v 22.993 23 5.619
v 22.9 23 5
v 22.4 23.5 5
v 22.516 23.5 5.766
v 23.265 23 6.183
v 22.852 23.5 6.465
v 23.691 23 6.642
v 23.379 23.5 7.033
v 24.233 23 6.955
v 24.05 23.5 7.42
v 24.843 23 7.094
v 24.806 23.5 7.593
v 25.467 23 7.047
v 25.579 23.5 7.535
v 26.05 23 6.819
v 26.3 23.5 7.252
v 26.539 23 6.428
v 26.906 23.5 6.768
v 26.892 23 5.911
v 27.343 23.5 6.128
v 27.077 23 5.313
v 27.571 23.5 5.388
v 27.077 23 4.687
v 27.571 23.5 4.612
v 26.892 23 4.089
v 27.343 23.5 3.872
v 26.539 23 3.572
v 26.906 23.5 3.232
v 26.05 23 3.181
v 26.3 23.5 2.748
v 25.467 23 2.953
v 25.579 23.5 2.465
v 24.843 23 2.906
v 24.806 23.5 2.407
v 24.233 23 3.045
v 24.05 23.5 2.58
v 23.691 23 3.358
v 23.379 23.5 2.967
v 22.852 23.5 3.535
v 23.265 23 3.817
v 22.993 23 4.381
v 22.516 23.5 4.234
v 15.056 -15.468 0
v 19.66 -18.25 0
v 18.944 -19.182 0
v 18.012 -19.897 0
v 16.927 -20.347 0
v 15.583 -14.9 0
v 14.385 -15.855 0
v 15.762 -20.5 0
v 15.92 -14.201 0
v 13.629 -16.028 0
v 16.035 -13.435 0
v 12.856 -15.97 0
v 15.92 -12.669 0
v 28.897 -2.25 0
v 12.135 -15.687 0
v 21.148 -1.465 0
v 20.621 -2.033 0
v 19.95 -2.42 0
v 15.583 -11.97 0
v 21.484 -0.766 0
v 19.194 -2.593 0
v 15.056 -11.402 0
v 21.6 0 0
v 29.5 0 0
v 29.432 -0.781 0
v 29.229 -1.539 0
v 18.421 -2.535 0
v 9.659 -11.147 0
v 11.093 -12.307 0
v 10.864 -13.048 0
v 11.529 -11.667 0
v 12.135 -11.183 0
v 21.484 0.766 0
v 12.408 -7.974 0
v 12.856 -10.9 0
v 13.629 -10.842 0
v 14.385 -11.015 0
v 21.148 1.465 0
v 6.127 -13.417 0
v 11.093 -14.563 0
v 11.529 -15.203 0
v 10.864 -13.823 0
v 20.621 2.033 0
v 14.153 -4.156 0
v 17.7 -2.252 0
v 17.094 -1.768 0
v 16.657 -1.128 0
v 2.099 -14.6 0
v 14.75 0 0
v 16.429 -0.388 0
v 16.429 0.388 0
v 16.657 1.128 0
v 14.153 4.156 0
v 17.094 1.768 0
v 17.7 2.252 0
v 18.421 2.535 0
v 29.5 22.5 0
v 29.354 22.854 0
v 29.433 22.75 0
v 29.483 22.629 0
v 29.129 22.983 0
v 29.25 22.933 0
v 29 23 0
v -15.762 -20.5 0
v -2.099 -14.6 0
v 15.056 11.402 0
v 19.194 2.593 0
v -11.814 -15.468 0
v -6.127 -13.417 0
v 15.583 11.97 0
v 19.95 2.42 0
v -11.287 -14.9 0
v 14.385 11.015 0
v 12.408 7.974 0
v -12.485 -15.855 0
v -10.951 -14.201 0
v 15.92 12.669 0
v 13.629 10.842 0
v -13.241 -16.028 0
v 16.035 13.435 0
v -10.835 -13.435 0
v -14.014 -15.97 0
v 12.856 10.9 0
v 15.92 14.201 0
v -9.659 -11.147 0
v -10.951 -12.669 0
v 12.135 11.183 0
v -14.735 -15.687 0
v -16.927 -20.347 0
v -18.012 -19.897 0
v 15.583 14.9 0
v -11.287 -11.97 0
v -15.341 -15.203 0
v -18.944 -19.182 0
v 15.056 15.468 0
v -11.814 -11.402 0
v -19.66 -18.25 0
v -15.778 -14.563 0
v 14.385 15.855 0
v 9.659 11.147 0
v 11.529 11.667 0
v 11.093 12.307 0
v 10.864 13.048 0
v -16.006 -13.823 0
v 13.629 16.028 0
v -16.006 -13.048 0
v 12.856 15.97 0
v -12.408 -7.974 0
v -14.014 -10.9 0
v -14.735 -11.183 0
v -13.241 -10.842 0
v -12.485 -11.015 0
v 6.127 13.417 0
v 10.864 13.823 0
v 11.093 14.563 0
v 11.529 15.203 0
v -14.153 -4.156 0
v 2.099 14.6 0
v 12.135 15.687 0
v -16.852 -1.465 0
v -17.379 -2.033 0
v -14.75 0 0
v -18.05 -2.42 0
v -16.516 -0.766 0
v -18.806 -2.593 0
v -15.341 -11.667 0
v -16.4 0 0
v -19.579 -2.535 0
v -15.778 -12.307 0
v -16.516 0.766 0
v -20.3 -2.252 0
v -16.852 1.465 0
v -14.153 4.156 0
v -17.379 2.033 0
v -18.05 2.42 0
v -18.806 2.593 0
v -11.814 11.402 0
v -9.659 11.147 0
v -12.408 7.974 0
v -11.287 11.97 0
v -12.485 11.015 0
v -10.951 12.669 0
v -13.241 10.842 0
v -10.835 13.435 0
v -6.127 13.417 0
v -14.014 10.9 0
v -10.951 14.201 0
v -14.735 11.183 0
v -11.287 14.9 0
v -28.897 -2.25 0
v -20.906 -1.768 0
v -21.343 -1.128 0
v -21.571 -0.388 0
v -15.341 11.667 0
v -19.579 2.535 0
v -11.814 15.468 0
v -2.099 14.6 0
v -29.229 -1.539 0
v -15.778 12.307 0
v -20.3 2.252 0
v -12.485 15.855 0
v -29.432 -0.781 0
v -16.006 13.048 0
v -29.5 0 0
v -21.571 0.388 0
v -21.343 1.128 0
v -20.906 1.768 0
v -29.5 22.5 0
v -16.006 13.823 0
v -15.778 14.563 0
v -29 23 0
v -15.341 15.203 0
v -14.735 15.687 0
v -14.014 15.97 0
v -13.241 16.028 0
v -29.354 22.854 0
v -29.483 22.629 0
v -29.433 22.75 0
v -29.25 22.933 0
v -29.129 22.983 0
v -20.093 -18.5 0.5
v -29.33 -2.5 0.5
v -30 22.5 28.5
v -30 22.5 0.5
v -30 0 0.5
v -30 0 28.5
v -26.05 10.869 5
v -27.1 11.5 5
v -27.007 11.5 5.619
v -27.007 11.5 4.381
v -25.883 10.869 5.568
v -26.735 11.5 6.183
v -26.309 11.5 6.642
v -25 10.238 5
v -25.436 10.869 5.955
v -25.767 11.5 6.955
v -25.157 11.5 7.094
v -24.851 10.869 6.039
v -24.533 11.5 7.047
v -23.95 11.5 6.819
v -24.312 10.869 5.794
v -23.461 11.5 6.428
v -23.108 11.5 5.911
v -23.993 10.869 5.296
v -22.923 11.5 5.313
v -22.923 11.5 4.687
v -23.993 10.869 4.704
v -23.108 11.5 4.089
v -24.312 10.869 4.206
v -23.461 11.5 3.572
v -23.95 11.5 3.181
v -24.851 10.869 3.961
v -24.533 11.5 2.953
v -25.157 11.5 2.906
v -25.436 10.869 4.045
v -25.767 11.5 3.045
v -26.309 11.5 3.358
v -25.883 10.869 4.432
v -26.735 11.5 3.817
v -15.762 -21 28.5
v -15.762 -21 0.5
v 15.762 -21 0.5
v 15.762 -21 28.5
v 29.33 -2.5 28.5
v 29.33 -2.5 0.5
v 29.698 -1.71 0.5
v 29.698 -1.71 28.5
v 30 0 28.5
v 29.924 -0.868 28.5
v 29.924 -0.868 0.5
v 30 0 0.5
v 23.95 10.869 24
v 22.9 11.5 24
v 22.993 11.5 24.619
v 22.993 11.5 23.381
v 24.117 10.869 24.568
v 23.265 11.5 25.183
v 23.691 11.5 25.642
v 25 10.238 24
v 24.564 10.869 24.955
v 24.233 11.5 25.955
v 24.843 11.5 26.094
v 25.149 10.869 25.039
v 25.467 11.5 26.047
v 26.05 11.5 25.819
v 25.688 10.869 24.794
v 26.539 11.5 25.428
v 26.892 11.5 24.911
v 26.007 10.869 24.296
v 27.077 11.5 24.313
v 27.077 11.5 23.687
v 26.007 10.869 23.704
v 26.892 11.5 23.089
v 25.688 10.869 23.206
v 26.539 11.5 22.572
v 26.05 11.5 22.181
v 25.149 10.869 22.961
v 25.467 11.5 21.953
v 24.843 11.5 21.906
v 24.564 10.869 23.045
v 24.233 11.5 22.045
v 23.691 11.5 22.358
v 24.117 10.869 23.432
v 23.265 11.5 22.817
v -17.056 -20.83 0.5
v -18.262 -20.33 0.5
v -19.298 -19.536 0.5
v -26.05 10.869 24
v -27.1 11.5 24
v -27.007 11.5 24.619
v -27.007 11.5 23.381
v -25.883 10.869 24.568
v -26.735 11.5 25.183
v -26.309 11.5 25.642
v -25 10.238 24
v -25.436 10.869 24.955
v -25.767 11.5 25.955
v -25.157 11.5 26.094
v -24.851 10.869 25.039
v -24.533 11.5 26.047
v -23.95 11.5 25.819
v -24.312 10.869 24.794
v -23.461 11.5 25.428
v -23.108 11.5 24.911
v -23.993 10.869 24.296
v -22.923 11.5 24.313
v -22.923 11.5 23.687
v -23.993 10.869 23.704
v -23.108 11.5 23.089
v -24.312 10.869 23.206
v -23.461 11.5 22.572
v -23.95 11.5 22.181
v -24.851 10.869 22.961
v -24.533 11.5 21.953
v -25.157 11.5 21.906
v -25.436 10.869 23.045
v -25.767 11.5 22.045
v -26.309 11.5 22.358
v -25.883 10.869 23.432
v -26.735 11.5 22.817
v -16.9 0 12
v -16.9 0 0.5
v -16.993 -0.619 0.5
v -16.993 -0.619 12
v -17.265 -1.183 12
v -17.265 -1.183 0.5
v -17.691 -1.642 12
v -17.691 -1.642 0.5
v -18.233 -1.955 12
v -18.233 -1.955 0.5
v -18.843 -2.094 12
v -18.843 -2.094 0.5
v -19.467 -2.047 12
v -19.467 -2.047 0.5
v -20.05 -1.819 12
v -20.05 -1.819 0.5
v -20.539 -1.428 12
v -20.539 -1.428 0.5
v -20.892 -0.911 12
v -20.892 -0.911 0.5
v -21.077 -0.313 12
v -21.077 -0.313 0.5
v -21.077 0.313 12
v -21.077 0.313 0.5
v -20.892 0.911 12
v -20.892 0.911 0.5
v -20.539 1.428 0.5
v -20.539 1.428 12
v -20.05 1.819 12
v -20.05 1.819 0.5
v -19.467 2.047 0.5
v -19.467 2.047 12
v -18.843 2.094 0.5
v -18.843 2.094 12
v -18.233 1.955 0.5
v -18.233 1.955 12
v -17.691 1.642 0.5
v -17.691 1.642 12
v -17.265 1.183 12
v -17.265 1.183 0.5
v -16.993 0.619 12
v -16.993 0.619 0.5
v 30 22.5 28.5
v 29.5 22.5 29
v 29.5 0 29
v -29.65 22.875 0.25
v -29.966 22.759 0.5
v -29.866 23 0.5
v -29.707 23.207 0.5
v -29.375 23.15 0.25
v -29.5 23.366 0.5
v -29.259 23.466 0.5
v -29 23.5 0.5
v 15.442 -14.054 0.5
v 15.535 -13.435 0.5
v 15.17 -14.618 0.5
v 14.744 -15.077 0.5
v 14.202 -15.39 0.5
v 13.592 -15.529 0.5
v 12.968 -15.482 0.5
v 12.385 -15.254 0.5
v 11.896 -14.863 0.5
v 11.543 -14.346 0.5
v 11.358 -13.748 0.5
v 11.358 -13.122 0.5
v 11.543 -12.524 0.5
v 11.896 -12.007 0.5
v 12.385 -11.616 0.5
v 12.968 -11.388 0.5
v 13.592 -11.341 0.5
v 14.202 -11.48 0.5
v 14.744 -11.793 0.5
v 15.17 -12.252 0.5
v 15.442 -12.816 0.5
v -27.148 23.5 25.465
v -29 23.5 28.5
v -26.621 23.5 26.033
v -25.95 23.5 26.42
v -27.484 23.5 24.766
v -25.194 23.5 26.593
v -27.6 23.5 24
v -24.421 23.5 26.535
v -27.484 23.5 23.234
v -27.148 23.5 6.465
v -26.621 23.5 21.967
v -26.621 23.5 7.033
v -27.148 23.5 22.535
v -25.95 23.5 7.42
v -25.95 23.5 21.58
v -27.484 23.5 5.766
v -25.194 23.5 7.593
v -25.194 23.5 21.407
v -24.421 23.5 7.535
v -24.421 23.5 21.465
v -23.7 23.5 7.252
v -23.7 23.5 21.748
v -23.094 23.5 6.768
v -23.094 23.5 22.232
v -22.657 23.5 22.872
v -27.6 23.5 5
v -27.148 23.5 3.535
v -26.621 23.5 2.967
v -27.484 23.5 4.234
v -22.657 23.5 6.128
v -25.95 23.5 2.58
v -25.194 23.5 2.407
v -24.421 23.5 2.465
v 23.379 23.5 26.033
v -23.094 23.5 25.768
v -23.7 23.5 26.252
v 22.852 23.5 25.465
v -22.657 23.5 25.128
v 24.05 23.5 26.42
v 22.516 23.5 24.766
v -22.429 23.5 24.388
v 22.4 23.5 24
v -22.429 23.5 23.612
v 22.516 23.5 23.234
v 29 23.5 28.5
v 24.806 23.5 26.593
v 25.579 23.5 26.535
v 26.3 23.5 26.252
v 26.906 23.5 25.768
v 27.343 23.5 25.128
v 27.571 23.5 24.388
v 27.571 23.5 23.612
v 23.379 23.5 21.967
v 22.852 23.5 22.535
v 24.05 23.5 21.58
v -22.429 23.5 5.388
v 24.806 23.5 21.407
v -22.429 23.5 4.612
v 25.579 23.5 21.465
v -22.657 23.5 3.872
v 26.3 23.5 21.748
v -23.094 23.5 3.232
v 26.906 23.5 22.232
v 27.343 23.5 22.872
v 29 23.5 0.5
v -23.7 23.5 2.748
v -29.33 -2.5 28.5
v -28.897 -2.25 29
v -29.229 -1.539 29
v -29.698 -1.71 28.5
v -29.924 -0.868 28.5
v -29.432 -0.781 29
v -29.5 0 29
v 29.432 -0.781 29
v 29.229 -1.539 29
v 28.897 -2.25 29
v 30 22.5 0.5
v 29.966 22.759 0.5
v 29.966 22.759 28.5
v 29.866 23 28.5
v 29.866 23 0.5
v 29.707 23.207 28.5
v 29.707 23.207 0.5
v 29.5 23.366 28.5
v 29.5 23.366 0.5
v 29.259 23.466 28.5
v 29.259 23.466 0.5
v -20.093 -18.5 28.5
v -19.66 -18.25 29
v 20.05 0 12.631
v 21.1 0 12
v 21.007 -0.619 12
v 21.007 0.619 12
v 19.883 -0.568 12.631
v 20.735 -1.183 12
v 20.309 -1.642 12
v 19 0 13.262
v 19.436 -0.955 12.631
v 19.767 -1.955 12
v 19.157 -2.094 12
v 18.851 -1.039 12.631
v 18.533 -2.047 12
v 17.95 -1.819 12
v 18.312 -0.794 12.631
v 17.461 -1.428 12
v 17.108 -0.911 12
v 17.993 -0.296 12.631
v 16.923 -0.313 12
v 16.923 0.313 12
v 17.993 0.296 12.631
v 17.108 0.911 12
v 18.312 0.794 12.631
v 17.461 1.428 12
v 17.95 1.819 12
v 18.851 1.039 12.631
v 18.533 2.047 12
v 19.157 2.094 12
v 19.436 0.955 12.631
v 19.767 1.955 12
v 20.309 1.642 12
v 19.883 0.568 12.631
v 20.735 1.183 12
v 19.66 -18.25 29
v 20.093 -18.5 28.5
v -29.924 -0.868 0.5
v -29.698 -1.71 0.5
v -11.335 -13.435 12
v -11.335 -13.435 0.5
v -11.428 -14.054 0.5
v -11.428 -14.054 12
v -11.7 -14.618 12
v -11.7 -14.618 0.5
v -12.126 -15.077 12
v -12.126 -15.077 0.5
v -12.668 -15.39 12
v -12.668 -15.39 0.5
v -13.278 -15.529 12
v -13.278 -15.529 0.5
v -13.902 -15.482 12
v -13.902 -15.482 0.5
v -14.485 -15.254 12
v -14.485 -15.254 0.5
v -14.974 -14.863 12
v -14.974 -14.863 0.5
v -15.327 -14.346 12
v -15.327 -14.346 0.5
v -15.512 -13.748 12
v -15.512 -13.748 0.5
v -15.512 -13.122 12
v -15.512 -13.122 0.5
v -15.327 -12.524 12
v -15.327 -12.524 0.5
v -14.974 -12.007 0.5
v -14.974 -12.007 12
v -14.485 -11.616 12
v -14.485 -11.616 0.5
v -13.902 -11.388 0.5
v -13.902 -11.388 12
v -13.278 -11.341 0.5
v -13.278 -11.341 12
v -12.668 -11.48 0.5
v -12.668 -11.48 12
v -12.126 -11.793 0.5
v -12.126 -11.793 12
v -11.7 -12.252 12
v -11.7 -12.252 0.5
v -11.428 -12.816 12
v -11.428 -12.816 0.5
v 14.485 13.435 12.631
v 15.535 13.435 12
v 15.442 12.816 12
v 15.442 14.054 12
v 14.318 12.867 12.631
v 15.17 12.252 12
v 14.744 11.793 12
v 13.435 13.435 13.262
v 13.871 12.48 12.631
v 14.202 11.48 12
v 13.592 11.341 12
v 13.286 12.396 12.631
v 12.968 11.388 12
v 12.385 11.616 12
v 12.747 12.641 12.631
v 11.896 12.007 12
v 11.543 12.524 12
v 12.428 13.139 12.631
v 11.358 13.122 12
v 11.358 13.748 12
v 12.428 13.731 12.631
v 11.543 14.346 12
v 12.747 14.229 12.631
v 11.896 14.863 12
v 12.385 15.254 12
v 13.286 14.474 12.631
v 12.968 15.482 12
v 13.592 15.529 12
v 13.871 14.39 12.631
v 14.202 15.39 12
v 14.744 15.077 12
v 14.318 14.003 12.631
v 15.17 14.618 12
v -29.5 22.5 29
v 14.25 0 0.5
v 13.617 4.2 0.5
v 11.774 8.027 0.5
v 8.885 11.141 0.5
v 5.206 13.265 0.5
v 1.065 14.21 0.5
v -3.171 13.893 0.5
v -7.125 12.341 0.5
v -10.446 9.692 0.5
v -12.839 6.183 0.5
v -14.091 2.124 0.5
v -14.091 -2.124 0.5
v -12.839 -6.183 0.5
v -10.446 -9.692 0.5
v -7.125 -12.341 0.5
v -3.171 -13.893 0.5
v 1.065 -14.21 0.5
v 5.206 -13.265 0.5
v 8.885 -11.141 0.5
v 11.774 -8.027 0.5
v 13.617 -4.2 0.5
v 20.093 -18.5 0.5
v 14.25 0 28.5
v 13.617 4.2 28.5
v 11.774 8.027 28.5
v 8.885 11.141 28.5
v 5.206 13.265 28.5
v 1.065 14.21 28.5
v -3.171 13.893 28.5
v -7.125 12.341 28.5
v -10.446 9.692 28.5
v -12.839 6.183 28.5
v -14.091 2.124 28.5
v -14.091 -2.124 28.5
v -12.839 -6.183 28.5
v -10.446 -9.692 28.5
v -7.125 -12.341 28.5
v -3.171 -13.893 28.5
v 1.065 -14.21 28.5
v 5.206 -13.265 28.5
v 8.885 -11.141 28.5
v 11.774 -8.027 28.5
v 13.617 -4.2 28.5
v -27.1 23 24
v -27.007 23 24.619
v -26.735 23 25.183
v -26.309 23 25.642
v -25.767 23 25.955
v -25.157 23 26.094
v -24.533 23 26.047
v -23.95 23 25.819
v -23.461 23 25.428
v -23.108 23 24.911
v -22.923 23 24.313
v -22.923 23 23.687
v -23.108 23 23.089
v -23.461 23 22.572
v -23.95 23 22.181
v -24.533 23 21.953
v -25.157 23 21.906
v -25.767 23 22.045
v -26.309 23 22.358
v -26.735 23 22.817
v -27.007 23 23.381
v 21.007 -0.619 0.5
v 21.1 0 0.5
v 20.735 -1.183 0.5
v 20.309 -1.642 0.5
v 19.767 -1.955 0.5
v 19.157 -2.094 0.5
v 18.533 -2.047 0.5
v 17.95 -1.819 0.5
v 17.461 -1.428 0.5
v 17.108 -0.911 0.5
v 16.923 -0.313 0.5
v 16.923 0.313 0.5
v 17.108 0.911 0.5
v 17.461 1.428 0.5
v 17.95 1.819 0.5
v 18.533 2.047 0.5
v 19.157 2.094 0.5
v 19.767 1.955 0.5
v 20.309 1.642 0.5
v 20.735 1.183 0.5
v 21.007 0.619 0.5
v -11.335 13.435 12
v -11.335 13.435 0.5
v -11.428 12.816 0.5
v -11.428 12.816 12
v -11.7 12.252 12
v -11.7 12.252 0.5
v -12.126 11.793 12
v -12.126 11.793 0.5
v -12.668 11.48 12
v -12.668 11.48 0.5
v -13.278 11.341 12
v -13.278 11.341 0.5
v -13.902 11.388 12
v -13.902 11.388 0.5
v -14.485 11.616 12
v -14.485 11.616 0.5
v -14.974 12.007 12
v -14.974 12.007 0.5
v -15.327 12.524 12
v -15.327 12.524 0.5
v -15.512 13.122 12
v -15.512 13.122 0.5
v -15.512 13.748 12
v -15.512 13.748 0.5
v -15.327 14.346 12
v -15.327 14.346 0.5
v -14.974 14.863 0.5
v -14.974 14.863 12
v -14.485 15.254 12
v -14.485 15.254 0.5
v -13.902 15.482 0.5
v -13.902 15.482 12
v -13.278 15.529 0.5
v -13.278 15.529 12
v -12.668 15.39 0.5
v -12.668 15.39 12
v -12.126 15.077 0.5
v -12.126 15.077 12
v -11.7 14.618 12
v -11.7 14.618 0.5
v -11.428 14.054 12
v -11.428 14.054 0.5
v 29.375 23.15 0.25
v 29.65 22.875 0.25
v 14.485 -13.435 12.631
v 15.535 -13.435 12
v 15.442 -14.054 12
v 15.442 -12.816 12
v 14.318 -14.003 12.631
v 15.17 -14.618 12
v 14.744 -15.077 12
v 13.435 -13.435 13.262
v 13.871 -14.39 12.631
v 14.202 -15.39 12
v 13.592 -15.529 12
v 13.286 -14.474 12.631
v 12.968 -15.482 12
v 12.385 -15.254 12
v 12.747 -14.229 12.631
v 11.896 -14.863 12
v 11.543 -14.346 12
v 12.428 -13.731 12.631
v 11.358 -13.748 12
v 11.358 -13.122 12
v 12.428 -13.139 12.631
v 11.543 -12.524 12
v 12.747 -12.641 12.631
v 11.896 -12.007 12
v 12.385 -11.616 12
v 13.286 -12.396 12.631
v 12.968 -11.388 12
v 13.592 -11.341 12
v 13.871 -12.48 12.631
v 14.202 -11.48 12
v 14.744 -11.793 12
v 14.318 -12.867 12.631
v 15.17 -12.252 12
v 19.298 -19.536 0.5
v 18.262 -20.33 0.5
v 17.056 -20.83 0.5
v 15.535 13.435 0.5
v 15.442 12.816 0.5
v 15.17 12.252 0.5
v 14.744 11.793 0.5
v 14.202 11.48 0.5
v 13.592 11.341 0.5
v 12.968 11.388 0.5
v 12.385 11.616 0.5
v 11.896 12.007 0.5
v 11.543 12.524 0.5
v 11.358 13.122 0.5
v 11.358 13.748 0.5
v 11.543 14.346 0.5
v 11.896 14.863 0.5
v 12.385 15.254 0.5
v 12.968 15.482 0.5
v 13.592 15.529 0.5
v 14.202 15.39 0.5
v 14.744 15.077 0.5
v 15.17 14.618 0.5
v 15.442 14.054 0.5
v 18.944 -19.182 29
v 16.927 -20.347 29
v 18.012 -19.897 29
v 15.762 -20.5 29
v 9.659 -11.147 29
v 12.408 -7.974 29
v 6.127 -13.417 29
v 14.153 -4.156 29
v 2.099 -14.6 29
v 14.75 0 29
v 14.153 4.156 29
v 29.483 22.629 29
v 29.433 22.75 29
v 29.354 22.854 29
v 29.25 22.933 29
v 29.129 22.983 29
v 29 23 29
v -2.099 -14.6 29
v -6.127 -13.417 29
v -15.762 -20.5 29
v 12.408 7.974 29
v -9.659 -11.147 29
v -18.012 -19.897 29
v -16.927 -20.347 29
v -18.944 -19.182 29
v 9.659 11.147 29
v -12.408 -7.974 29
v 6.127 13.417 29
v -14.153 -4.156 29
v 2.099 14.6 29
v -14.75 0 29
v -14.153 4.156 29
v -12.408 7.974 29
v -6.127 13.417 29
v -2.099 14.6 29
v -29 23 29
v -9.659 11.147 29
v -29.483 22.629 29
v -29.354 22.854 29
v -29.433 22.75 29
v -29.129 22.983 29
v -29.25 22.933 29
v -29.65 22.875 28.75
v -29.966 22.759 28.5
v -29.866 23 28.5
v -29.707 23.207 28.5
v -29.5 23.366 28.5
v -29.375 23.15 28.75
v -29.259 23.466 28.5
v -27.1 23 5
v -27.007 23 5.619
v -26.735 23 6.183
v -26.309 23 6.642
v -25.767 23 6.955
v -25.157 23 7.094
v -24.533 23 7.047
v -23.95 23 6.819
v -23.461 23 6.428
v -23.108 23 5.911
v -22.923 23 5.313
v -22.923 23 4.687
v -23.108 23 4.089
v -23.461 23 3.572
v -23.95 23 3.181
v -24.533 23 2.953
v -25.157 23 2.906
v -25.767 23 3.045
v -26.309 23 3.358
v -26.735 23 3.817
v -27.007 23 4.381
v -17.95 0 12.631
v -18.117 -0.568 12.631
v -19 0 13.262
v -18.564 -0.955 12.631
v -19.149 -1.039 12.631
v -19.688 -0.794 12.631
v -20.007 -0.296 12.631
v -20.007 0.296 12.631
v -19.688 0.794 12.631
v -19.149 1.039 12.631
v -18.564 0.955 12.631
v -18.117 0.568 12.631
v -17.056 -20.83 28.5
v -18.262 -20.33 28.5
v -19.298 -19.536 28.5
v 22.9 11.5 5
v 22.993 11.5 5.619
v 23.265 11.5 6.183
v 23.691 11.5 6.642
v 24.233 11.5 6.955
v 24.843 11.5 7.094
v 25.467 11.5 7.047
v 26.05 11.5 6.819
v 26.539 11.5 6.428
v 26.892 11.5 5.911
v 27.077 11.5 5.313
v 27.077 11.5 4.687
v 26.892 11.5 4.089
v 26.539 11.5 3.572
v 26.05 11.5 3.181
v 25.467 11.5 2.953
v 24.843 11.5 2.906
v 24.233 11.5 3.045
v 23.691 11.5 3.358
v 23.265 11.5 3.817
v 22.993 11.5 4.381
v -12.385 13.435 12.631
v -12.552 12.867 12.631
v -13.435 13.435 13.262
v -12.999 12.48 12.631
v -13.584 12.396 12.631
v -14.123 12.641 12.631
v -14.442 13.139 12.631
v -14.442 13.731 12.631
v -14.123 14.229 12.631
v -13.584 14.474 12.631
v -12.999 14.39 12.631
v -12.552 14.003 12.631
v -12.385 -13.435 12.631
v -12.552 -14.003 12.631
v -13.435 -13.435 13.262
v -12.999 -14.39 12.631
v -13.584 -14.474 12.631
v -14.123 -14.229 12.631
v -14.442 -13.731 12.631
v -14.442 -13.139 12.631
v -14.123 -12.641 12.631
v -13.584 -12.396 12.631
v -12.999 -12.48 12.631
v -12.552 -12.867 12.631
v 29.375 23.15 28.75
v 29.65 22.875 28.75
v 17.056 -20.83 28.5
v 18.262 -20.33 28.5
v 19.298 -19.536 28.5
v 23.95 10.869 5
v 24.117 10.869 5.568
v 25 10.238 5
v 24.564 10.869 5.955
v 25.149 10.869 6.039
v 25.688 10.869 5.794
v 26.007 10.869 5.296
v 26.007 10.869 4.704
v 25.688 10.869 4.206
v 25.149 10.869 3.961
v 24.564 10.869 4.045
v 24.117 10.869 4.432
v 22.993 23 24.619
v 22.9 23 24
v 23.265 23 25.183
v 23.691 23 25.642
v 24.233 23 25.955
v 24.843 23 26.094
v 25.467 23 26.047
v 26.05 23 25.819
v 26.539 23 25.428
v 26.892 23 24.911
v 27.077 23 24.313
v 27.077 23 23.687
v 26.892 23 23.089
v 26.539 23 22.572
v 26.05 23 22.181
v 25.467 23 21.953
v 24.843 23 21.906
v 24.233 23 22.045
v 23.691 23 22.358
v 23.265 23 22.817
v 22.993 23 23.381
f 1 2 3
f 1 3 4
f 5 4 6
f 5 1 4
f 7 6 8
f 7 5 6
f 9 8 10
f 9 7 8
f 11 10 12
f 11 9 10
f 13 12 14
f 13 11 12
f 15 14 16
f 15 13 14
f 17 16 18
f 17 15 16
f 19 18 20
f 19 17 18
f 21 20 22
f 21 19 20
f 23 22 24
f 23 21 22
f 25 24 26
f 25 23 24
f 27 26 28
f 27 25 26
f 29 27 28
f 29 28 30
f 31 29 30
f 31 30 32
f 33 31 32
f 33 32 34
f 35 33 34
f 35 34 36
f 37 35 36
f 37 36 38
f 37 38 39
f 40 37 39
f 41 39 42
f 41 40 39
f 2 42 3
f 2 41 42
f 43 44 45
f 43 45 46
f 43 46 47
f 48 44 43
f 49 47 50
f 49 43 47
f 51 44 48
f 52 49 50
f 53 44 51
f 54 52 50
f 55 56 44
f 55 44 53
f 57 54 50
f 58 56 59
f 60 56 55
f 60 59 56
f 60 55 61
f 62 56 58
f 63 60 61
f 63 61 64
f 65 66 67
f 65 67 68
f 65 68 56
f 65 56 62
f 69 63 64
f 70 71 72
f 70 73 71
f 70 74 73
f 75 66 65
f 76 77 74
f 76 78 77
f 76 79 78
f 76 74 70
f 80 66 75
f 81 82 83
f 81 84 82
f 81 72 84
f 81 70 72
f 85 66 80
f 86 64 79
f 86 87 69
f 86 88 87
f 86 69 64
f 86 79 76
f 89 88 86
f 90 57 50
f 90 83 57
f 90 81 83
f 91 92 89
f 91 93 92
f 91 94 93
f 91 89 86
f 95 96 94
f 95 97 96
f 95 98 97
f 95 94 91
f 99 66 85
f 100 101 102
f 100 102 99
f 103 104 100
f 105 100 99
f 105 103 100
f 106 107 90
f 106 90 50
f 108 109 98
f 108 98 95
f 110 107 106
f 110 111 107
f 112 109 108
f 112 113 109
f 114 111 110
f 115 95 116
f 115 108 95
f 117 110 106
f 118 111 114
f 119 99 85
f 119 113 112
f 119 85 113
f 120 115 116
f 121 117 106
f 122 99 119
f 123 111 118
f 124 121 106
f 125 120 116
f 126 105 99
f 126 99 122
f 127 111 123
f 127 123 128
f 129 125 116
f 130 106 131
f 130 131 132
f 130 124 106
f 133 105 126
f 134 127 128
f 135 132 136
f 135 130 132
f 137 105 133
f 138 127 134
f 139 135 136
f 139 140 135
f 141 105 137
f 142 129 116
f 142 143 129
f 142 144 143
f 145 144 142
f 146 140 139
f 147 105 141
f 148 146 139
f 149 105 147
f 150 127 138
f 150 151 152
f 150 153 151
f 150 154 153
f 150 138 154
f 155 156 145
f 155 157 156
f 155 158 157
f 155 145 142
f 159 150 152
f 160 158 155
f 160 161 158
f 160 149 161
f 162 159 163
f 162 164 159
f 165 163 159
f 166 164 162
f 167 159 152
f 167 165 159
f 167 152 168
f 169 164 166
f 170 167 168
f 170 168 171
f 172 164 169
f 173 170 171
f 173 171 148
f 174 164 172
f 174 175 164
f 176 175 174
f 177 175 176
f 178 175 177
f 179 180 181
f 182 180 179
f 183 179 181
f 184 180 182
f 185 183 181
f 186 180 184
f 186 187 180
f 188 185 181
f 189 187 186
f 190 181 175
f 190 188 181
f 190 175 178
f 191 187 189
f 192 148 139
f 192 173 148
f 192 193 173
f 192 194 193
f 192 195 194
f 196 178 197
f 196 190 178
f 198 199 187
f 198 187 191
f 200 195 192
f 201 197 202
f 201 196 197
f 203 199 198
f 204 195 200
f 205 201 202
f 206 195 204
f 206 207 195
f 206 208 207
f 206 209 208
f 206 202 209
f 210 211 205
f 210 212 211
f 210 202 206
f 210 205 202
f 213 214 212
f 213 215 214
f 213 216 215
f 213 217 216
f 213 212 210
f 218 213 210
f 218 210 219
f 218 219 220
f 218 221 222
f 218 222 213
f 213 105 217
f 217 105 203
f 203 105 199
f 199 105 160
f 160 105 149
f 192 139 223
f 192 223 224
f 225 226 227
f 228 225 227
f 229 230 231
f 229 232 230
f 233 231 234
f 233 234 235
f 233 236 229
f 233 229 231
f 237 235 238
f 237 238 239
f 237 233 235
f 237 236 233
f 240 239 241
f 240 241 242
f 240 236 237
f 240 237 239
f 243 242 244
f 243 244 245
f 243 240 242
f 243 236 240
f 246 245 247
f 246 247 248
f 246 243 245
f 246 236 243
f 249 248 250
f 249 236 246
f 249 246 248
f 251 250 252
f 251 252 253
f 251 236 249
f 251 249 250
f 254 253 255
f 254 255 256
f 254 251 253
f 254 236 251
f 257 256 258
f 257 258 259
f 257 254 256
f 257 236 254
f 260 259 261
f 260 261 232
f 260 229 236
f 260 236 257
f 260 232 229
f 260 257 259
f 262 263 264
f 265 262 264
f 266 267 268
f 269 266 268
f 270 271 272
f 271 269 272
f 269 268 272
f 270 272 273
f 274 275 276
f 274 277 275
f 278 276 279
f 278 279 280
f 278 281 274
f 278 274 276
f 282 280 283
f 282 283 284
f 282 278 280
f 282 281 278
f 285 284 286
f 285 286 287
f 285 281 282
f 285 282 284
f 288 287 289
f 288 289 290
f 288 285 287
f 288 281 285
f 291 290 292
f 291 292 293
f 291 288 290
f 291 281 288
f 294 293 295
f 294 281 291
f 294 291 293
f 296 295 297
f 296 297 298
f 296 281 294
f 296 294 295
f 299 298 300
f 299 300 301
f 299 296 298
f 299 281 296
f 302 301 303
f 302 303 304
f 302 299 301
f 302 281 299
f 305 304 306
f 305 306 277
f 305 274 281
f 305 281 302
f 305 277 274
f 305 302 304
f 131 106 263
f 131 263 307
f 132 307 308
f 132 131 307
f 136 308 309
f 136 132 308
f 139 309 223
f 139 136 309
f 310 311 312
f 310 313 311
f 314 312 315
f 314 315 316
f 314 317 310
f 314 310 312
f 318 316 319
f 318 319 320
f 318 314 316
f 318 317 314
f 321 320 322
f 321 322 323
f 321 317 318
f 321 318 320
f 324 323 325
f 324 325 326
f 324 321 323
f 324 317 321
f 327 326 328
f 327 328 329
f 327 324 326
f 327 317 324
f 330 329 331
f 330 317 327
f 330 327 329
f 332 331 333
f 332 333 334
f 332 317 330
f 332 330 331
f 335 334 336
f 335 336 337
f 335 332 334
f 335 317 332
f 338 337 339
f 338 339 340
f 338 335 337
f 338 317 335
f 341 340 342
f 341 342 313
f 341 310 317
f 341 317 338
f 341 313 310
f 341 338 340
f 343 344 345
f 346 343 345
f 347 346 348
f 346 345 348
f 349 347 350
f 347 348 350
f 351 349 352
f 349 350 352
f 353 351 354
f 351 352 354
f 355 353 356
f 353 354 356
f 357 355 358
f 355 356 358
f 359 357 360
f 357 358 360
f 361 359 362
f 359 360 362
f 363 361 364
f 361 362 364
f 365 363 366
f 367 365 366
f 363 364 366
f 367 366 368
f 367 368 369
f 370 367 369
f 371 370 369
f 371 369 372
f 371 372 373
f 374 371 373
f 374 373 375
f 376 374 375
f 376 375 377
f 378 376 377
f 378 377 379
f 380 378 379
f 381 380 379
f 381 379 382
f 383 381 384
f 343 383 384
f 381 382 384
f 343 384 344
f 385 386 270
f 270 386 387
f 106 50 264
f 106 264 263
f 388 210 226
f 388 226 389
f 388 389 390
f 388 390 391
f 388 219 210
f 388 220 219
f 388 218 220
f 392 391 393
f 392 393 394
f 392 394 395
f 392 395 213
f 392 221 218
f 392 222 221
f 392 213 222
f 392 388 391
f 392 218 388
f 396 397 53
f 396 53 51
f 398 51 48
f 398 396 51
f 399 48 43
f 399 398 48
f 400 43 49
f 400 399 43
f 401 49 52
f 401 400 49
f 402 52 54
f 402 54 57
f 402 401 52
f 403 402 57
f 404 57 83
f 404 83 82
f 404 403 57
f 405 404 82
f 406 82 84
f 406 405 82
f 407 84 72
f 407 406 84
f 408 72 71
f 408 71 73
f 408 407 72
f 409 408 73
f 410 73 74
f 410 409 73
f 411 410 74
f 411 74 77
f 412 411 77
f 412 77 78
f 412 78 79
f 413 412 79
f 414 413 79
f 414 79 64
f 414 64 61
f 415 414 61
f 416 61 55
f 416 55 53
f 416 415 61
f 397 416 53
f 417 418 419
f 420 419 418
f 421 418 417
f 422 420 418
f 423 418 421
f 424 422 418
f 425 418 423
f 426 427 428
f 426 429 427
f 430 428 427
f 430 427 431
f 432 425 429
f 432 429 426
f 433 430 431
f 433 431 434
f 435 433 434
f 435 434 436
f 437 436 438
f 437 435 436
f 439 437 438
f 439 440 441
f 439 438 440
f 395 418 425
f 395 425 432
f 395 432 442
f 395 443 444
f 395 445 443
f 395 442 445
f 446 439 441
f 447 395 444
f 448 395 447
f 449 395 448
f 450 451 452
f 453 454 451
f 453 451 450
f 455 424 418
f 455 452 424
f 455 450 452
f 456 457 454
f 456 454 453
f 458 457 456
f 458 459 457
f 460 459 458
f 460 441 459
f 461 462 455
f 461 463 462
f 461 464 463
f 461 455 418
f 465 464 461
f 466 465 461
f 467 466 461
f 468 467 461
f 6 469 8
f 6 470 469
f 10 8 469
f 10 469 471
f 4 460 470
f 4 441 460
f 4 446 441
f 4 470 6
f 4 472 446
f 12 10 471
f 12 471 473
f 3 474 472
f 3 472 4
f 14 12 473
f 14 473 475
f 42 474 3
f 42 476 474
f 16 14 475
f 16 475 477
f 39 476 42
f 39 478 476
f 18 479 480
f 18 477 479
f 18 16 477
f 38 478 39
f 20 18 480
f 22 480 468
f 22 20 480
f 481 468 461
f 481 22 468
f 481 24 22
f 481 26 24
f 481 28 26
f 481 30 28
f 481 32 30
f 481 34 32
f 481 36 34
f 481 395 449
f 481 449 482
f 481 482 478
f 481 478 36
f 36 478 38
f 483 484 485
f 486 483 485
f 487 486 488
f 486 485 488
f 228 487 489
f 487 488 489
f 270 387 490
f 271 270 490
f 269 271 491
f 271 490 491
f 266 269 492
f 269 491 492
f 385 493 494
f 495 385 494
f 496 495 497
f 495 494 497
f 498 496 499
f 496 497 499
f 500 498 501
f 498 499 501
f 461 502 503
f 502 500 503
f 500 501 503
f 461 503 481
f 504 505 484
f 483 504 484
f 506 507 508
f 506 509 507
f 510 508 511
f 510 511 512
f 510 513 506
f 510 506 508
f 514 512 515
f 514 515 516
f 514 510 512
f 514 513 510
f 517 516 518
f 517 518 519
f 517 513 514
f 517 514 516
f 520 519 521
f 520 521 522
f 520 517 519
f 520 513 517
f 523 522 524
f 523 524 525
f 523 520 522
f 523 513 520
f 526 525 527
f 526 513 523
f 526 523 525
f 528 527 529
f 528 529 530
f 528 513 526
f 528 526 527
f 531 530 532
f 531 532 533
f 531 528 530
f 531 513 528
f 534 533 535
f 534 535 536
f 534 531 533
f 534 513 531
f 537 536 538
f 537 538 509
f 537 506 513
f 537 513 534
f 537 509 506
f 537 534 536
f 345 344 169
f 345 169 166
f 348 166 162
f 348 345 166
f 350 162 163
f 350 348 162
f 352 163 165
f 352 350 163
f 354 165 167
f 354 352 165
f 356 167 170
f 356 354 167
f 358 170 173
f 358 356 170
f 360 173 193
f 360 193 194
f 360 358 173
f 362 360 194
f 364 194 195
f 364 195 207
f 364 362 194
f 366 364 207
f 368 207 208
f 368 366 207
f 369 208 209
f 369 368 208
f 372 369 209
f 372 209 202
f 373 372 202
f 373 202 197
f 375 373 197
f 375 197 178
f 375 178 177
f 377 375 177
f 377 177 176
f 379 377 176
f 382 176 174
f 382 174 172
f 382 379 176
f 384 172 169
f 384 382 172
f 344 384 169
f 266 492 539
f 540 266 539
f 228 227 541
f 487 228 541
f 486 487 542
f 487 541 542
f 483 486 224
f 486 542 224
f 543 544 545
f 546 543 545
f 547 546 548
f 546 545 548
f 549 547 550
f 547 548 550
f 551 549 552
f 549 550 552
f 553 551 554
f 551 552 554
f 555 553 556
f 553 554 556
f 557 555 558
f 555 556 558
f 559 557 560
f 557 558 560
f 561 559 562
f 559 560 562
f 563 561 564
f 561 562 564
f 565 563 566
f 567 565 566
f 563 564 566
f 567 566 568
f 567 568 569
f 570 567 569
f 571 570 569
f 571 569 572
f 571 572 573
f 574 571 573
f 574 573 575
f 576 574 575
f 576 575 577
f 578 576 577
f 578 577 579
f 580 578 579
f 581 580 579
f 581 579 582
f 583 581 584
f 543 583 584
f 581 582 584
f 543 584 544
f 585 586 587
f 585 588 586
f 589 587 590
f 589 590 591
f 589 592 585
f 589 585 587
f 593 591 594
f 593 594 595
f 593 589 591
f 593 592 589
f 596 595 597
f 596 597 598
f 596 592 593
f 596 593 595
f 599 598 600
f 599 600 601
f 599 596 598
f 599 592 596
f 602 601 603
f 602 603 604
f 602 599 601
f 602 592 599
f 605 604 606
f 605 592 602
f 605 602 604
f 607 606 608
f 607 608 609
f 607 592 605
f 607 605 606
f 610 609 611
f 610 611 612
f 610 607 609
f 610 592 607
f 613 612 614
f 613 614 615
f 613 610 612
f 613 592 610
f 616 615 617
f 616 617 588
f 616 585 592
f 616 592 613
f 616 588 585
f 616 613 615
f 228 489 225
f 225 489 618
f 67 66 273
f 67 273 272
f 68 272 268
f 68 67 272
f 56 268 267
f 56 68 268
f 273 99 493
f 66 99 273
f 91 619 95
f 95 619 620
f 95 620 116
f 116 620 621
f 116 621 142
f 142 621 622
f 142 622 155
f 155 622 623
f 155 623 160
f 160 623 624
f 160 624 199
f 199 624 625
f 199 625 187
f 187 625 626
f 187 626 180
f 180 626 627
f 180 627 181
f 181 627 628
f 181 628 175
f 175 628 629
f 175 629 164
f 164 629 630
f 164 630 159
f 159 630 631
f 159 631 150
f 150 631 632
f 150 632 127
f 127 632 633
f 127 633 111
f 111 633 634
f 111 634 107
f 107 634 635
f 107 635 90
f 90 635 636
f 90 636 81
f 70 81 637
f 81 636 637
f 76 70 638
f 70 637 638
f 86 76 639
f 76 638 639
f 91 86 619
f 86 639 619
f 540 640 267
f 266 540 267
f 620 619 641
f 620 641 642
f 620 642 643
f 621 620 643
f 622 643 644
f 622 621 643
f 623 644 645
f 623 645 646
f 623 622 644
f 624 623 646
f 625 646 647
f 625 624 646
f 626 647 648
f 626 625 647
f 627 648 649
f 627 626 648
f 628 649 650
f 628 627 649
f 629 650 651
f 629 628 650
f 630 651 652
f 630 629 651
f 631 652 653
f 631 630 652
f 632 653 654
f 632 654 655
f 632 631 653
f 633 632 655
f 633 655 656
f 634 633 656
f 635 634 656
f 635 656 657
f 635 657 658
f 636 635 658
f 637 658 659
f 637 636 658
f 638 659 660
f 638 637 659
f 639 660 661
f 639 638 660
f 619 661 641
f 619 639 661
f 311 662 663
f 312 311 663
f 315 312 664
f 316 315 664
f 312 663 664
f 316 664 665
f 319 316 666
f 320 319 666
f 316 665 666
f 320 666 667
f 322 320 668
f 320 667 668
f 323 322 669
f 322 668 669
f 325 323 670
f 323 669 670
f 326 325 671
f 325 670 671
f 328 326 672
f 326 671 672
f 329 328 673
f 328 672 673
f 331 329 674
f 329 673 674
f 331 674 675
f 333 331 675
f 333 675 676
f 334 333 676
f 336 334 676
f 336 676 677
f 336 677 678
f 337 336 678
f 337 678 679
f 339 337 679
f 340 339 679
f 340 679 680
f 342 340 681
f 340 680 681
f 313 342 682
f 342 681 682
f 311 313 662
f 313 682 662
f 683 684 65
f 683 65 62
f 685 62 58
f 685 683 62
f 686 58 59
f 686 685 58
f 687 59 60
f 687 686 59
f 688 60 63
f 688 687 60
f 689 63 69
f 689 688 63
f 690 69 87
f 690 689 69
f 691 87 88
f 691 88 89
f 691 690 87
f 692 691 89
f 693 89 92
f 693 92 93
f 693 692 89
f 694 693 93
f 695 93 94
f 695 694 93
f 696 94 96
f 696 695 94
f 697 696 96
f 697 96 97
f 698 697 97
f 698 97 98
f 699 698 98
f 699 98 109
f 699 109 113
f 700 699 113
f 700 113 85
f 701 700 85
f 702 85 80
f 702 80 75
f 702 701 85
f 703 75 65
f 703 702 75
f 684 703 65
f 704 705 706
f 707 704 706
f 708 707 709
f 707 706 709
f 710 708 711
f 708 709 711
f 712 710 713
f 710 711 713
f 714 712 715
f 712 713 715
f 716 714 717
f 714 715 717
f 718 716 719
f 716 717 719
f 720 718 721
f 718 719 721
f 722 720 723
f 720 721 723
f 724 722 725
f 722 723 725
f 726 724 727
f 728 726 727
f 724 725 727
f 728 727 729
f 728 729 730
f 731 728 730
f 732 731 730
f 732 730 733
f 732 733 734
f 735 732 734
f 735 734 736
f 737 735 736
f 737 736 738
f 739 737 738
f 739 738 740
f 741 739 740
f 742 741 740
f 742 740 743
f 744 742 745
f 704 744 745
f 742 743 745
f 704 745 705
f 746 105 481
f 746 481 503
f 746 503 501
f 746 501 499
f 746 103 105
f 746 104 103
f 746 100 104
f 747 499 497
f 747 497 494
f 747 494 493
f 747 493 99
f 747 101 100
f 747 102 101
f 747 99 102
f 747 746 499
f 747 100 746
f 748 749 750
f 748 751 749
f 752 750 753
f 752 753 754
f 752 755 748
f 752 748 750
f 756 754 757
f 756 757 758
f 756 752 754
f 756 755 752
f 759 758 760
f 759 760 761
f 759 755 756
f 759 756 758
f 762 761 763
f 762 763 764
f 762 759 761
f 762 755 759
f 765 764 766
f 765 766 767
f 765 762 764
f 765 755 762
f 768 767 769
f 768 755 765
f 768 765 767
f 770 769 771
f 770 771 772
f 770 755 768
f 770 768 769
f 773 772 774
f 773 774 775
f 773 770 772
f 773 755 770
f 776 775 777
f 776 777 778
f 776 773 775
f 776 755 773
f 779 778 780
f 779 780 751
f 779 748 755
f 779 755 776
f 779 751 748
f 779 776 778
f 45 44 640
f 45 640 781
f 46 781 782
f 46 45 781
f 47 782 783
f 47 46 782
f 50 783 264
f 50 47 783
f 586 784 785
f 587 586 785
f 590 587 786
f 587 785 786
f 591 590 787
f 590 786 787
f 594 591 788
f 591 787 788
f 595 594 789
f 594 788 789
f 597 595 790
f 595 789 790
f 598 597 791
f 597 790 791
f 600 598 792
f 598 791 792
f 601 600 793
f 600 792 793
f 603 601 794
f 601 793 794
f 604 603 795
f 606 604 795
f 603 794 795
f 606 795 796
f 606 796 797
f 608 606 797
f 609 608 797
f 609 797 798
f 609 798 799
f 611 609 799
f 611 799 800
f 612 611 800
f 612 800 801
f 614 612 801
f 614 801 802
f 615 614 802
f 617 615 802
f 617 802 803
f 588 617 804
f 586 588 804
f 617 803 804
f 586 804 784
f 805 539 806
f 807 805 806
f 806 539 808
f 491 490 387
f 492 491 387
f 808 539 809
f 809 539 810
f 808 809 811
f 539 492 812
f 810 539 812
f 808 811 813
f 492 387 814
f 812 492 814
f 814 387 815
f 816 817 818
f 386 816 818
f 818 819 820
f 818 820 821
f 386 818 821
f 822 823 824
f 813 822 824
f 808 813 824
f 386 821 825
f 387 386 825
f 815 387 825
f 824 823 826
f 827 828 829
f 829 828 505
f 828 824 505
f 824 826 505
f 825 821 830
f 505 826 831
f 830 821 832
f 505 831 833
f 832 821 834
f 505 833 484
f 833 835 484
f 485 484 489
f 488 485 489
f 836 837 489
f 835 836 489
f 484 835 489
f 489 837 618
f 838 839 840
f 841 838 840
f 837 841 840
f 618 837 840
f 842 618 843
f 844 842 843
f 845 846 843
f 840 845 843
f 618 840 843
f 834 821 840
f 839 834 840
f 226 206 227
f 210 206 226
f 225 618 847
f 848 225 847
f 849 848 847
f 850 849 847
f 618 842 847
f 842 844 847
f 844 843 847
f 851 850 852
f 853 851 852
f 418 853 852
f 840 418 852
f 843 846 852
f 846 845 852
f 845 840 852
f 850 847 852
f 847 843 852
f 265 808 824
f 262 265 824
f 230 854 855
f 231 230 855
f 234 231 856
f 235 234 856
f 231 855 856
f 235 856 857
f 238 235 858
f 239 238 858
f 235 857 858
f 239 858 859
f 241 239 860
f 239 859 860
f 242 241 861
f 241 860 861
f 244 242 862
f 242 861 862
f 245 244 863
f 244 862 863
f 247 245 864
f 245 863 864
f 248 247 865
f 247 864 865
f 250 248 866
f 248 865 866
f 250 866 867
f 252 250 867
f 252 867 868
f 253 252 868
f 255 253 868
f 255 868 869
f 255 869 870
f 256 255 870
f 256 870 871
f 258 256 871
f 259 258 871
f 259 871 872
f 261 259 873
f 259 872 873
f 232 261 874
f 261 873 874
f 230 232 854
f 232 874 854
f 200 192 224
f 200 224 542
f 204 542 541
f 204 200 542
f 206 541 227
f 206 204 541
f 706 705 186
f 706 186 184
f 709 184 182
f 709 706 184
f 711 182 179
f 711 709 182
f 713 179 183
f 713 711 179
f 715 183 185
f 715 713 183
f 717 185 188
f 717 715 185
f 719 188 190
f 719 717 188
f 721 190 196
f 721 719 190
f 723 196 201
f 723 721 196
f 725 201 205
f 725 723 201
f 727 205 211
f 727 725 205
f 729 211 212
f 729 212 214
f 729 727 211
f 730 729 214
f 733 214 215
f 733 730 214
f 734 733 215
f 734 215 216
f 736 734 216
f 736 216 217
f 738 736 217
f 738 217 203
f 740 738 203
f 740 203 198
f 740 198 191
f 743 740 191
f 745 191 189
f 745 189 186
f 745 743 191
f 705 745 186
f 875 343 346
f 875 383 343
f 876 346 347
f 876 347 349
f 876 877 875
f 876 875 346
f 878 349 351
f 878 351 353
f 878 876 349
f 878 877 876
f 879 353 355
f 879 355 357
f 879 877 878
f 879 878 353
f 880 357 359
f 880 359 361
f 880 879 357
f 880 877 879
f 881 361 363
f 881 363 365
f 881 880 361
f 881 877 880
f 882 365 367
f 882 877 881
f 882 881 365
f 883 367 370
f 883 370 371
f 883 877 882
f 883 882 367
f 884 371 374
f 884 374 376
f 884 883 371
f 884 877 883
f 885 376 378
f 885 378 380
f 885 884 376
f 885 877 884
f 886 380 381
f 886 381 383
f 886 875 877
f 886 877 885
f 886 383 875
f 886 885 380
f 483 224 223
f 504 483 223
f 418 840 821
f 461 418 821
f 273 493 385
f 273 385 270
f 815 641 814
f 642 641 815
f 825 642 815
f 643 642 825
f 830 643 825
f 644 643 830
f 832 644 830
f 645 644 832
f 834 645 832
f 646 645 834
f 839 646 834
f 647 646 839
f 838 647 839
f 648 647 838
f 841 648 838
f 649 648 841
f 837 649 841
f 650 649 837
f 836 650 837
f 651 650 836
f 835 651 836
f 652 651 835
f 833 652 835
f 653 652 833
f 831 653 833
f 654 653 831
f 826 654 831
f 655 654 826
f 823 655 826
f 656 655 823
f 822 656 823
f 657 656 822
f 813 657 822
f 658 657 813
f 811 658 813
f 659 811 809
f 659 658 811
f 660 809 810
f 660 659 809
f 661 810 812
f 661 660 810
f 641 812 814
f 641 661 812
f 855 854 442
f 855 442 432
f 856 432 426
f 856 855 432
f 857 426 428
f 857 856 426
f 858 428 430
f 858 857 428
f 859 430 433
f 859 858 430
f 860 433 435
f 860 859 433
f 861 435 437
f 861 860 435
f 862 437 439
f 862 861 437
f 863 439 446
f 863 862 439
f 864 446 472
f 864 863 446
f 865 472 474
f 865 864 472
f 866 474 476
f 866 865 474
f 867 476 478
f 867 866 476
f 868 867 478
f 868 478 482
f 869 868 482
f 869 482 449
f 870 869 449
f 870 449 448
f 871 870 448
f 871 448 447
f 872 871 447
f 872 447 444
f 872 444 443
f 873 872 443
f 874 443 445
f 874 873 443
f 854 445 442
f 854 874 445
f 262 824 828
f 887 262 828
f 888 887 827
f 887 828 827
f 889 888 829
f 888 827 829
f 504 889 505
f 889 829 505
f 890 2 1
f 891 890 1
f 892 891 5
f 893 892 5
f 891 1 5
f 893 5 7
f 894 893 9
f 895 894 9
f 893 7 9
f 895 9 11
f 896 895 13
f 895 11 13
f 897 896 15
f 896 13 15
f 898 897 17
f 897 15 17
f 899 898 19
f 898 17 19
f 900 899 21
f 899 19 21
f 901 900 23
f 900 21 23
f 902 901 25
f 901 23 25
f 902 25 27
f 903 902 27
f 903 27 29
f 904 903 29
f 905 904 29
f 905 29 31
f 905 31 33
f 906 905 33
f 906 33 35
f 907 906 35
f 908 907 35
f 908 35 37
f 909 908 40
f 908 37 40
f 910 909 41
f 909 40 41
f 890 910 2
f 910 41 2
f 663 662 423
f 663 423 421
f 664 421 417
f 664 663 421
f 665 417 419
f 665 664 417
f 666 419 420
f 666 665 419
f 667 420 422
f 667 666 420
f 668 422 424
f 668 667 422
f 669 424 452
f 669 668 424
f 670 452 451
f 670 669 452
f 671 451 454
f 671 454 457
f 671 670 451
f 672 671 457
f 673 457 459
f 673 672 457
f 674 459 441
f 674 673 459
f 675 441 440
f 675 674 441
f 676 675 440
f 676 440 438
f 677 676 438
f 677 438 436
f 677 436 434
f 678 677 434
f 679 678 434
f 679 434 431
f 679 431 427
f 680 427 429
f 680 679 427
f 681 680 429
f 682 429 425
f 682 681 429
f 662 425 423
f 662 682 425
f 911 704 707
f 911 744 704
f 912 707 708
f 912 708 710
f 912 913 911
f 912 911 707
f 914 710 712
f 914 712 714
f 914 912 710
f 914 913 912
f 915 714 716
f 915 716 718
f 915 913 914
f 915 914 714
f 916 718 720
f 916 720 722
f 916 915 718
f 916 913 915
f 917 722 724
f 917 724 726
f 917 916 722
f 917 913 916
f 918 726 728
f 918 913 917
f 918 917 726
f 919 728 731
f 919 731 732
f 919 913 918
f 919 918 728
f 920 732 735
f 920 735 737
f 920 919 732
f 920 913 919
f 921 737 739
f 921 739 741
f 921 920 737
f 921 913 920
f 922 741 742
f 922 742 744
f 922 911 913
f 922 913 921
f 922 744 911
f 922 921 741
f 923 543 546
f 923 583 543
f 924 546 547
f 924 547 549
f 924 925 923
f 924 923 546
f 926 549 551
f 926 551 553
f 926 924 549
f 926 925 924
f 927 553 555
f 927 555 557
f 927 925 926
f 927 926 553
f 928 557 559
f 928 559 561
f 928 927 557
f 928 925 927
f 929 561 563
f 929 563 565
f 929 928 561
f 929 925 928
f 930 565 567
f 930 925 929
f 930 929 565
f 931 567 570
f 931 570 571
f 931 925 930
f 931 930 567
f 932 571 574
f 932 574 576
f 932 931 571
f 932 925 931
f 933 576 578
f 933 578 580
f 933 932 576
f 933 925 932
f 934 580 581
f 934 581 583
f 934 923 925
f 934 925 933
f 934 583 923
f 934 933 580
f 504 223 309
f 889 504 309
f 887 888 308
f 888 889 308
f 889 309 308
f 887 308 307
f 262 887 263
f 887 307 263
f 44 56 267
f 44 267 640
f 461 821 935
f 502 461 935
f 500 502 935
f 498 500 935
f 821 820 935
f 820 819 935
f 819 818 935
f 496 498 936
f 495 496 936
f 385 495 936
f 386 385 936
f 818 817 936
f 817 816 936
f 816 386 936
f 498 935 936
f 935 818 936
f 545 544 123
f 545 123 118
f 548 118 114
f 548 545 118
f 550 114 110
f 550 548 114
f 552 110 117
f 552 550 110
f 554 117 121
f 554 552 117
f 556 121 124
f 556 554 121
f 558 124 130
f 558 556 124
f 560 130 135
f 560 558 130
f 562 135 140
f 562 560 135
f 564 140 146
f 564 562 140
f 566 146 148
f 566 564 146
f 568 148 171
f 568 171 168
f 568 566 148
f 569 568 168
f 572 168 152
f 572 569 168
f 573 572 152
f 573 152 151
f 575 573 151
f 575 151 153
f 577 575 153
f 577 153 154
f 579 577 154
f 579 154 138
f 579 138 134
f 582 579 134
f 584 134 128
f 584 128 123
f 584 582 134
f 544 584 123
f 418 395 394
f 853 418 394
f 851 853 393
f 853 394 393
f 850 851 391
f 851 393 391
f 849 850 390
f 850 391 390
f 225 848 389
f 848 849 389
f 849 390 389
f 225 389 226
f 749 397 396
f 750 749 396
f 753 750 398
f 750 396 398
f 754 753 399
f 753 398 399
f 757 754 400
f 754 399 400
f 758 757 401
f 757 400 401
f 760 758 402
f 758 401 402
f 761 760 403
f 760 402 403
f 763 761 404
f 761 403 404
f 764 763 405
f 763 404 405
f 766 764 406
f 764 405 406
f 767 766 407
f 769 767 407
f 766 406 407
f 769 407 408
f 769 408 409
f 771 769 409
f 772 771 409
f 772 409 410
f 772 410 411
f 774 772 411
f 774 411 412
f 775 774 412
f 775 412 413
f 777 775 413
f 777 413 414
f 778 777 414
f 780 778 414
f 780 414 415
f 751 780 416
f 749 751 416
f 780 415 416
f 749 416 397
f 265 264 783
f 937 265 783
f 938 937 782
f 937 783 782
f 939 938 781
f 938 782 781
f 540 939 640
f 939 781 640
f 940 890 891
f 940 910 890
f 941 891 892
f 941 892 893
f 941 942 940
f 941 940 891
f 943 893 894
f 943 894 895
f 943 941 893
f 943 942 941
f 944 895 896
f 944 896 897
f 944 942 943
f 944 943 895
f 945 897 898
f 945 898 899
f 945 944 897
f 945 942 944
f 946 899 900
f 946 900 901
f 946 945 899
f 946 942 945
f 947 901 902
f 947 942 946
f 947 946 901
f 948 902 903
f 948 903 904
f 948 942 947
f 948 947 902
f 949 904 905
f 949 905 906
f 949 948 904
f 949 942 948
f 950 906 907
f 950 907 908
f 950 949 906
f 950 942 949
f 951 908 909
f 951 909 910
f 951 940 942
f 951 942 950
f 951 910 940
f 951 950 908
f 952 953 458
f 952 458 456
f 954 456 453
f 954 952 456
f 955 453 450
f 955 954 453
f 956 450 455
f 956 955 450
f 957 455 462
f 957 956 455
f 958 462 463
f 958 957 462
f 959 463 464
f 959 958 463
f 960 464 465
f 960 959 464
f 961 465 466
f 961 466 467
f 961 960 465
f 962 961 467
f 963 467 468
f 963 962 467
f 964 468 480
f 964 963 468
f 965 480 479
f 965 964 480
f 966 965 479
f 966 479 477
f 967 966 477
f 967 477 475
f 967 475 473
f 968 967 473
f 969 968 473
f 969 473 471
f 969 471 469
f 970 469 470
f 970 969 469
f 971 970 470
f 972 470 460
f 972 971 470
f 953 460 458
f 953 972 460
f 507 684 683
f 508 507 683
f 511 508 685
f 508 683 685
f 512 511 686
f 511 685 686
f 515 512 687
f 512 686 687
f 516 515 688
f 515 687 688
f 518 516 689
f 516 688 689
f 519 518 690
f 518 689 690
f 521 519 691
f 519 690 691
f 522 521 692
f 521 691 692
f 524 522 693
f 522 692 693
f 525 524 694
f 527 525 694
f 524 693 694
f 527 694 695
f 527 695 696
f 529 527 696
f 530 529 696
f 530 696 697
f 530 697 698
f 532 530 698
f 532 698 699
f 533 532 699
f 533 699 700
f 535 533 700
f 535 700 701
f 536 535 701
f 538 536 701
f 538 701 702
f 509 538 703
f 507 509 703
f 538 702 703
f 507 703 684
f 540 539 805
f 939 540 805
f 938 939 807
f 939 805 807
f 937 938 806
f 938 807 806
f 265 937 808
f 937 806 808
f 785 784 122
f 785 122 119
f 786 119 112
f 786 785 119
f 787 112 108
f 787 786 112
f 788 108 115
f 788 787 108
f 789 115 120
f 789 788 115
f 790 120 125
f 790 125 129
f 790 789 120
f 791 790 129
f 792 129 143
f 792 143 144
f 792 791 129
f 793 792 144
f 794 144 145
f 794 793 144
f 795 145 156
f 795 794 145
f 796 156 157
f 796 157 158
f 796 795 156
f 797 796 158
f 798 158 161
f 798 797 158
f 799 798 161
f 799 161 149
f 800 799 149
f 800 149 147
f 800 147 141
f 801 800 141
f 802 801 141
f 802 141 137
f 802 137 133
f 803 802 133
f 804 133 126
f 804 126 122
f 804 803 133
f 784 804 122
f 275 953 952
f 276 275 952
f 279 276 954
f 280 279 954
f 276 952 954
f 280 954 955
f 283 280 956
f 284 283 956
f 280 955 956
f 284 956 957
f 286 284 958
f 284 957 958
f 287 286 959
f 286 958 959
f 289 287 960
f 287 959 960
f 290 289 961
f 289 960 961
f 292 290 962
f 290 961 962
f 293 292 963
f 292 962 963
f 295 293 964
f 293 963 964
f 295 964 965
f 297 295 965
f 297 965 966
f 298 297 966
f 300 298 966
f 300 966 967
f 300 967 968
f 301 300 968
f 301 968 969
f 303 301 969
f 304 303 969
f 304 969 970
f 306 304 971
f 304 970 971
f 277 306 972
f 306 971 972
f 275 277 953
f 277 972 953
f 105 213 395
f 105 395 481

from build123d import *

# Parameters (mm, degrees)
SKETCH_R       = 14.25
PAD_DEPTH      = 29
SKETCH001_R    = 2.1
HOLE_DEPTH     = 12
HOLE_TIPS_R    = 2.1
SKETCH002_R    = 2.1
HOLE001_DEPTH  = 12
HOLE001_TIPS_R = 2.1
CHAMFER_SIZE   = 0.5


with BuildPart() as part:
    # Sketch → Pad (new body)
    with BuildSketch(Plane.XY):
        with BuildLine():
            Line((-29, 23.5), (29, 23.5))
            ThreePointArc((30, 22.5), (29.707107, 23.207107), (29, 23.5))
            Line((30, 22.5), (30, 0))
            ThreePointArc((29.330127, -2.5), (29.829629, -1.294095), (30, 0))
            Line((20.092523, -18.5), (29.330127, -2.5))
            ThreePointArc((15.762396, -21), (18.262396, -20.330127), (20.092523, -18.5))
            Line((-15.762396, -21), (15.762396, -21))
            ThreePointArc((-20.092523, -18.5), (-18.262396, -20.330127), (-15.762396, -21))
            Line((-29.330127, -2.5), (-20.092523, -18.5))
            ThreePointArc((-30, 0), (-29.829629, -1.294095), (-29.330127, -2.5))
            Line((-30, 22.5), (-30, 0))
            ThreePointArc((-29, 23.5), (-29.707107, 23.207107), (-30, 22.5))
        make_face()
        Circle(SKETCH_R, mode=Mode.SUBTRACT)
    extrude(amount=PAD_DEPTH)

    # Sketch001 (on Face14 of Pad) → Hole (cut)
    with BuildSketch(Plane(origin=(0, 0, 0), x_dir=(1, 0, 0), z_dir=(0, 0, -1))):
        with Locations((-19, 0)):
            Circle(SKETCH001_R)
        with Locations((-13.435029, 13.435029)):
            Circle(SKETCH001_R)
        with Locations((13.435029, 13.435029)):
            Circle(SKETCH001_R)
        with Locations((19, 0)):
            Circle(SKETCH001_R)
        with Locations((13.435029, -13.435029)):
            Circle(SKETCH001_R)
        with Locations((-13.435029, -13.435029)):
            Circle(SKETCH001_R)
    extrude(amount=-HOLE_DEPTH, mode=Mode.SUBTRACT)

    # Hole tips → Hole tip 1 section 0
    with BuildSketch(Plane(origin=(0, 0, 12), x_dir=(1, 0, 0), z_dir=(0, 0, -1)), mode=Mode.PRIVATE) as hole_tip_1_s0:
        with Locations((-19, 0)):
            Circle(HOLE_TIPS_R)
    loft([hole_tip_1_s0.sketch, Vertex(-19, 0, 13.261807)], mode=Mode.SUBTRACT)

    # Hole tips → Hole tip 2 section 0
    with BuildSketch(Plane(origin=(0, 0, 12), x_dir=(1, 0, 0), z_dir=(0, 0, -1)), mode=Mode.PRIVATE) as hole_tip_2_s0:
        with Locations((-13.435029, 13.435029)):
            Circle(HOLE_TIPS_R)
    loft([hole_tip_2_s0.sketch, Vertex(-13.435029, -13.435029, 13.261807)], mode=Mode.SUBTRACT)

    # Hole tips → Hole tip 3 section 0
    with BuildSketch(Plane(origin=(0, 0, 12), x_dir=(1, 0, 0), z_dir=(0, 0, -1)), mode=Mode.PRIVATE) as hole_tip_3_s0:
        with Locations((13.435029, 13.435029)):
            Circle(HOLE_TIPS_R)
    loft([hole_tip_3_s0.sketch, Vertex(13.435029, -13.435029, 13.261807)], mode=Mode.SUBTRACT)

    # Hole tips → Hole tip 4 section 0
    with BuildSketch(Plane(origin=(0, 0, 12), x_dir=(1, 0, 0), z_dir=(0, 0, -1)), mode=Mode.PRIVATE) as hole_tip_4_s0:
        with Locations((19, 0)):
            Circle(HOLE_TIPS_R)
    loft([hole_tip_4_s0.sketch, Vertex(19, 0, 13.261807)], mode=Mode.SUBTRACT)

    # Hole tips → Hole tip 5 section 0
    with BuildSketch(Plane(origin=(0, 0, 12), x_dir=(1, 0, 0), z_dir=(0, 0, -1)), mode=Mode.PRIVATE) as hole_tip_5_s0:
        with Locations((13.435029, -13.435029)):
            Circle(HOLE_TIPS_R)
    loft([hole_tip_5_s0.sketch, Vertex(13.435029, 13.435029, 13.261807)], mode=Mode.SUBTRACT)

    # Hole tips → Hole tip 6 section 0
    with BuildSketch(Plane(origin=(0, 0, 12), x_dir=(1, 0, 0), z_dir=(0, 0, -1)), mode=Mode.PRIVATE) as hole_tip_6_s0:
        with Locations((-13.435029, -13.435029)):
            Circle(HOLE_TIPS_R)
    loft([hole_tip_6_s0.sketch, Vertex(-13.435029, 13.435029, 13.261807)], mode=Mode.SUBTRACT)

    # Sketch002 (on Face2 of Hole) → Hole001 (cut)
    with BuildSketch(Plane(origin=(0, 23.5, 0), x_dir=(-1, 0, 0), z_dir=(0, 1, 0))):
        with Locations((-25, 5)):
            Circle(SKETCH002_R)
        with Locations((25, 5)):
            Circle(SKETCH002_R)
        with Locations((-25, 24)):
            Circle(SKETCH002_R)
        with Locations((25, 24)):
            Circle(SKETCH002_R)
    extrude(amount=-HOLE001_DEPTH, mode=Mode.SUBTRACT)

    # Hole001 tips → Hole001 tip 1 section 0
    with BuildSketch(Plane(origin=(0, 11.5, 0), x_dir=(-1, 0, 0), z_dir=(0, 1, 0)), mode=Mode.PRIVATE) as hole001_tip_1_s0:
        with Locations((-25, 5)):
            Circle(HOLE001_TIPS_R)
    loft([hole001_tip_1_s0.sketch, Vertex(25, 10.238193, 5)], mode=Mode.SUBTRACT)

    # Hole001 tips → Hole001 tip 2 section 0
    with BuildSketch(Plane(origin=(0, 11.5, 0), x_dir=(-1, 0, 0), z_dir=(0, 1, 0)), mode=Mode.PRIVATE) as hole001_tip_2_s0:
        with Locations((25, 5)):
            Circle(HOLE001_TIPS_R)
    loft([hole001_tip_2_s0.sketch, Vertex(-25, 10.238193, 5)], mode=Mode.SUBTRACT)

    # Hole001 tips → Hole001 tip 3 section 0
    with BuildSketch(Plane(origin=(0, 11.5, 0), x_dir=(-1, 0, 0), z_dir=(0, 1, 0)), mode=Mode.PRIVATE) as hole001_tip_3_s0:
        with Locations((-25, 24)):
            Circle(HOLE001_TIPS_R)
    loft([hole001_tip_3_s0.sketch, Vertex(25, 10.238193, 24)], mode=Mode.SUBTRACT)

    # Hole001 tips → Hole001 tip 4 section 0
    with BuildSketch(Plane(origin=(0, 11.5, 0), x_dir=(-1, 0, 0), z_dir=(0, 1, 0)), mode=Mode.PRIVATE) as hole001_tip_4_s0:
        with Locations((25, 24)):
            Circle(HOLE001_TIPS_R)
    loft([hole001_tip_4_s0.sketch, Vertex(-25, 10.238193, 24)], mode=Mode.SUBTRACT)

    # Chamfer
    chamfer_edges = [part.edges().sort_by_distance(p)[0] for p in [
        (-14.25, 0, 0),
        (-16.9, 0, 0),
        (-11.335029, -13.435029, 0),
        (-11.335029, 13.435029, 0),
        (15.535029, -13.435029, 0),
        (21.1, 0, 0),
        (15.535029, 13.435029, 0),
        (0, 23.5, 0),
        (0, 23.5, 29),
        (-27.1, 23.5, 24),
        (22.9, 23.5, 24),
        (22.9, 23.5, 5),
        (-27.1, 23.5, 5),
        (-14.25, 0, 29),
    ]]
    chamfer(chamfer_edges, length=CHAMFER_SIZE)


solid = part.part
